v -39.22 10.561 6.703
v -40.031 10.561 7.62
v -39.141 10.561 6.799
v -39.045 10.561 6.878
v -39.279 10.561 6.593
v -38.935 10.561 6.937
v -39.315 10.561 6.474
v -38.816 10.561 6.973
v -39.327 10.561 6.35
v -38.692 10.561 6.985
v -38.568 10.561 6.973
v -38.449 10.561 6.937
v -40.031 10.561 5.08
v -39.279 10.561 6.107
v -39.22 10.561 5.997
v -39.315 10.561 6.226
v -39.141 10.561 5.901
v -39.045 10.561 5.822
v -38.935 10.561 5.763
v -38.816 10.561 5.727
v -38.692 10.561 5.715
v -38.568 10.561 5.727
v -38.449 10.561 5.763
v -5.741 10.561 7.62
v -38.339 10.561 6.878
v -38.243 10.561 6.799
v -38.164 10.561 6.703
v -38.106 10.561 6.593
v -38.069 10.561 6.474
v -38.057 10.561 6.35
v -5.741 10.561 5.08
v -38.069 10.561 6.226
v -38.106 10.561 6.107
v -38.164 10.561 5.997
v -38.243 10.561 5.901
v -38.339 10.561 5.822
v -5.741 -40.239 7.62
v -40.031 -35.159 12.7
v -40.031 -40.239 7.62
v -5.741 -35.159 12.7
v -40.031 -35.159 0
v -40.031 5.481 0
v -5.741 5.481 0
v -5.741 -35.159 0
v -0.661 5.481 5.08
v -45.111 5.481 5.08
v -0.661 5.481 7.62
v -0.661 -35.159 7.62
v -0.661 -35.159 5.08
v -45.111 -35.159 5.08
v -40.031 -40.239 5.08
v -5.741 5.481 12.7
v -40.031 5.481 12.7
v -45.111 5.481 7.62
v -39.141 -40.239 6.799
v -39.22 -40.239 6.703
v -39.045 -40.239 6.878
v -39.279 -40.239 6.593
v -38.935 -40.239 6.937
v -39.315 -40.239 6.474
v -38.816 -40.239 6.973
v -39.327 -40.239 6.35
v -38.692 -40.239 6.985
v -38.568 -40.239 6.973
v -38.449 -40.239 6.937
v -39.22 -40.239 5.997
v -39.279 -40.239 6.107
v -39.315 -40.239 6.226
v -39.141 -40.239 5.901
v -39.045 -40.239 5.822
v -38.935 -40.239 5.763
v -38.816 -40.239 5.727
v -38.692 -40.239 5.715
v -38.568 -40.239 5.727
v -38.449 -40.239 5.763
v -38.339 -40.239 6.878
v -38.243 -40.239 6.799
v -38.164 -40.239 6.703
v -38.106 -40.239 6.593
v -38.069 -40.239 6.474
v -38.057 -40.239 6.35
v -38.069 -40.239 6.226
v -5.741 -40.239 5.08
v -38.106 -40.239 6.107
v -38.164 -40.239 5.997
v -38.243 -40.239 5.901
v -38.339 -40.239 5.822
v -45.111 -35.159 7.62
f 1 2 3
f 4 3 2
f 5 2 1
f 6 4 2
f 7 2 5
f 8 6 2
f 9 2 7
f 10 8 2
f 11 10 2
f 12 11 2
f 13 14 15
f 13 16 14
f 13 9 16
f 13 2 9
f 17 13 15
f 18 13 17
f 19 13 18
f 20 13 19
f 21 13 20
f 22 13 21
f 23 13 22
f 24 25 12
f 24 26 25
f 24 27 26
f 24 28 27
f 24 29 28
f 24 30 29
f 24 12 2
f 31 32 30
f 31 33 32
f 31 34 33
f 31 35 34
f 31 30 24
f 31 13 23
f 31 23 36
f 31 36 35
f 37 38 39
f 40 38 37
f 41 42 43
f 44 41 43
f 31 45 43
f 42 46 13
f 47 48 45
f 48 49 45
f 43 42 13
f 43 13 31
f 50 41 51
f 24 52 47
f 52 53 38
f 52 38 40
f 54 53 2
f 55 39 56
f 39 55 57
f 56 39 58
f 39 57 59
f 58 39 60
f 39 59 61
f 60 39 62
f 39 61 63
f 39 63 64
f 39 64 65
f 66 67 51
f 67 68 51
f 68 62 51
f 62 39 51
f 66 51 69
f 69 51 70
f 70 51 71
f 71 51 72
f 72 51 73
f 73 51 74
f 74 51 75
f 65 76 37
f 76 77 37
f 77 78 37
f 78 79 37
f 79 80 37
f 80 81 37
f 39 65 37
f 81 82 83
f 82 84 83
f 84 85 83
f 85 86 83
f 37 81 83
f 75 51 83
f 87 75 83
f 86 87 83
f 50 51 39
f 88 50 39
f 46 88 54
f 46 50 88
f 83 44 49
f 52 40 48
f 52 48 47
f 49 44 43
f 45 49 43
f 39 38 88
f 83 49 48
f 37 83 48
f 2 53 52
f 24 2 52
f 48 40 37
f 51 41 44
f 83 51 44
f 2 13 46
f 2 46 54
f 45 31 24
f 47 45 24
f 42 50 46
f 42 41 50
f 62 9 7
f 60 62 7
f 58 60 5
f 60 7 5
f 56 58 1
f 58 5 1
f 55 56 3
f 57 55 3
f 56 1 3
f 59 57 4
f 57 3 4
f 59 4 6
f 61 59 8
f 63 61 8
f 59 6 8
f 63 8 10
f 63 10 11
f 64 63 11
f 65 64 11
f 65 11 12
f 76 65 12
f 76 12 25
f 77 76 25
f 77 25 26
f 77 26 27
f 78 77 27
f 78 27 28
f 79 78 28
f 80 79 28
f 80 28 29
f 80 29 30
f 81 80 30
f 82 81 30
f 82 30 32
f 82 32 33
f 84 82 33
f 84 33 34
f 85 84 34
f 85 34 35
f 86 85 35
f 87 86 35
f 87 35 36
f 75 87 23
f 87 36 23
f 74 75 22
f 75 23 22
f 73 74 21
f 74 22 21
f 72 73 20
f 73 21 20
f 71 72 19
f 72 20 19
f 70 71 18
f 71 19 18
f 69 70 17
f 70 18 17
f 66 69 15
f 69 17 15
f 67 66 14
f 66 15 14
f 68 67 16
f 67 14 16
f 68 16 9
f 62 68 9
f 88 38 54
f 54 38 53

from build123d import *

# Parameters (mm, degrees)
F0_W     = 44.45
F0_H     = 50.8
F1_DEPTH = 12.7
F2_SIZE  = 5.08
F4_D     = 1.27


with BuildPart() as f1:
    # F0 (on Top) → F1 (new body)
    with BuildSketch(Plane.XY):
        with Locations((-22.886127, -14.839125)):
            Rectangle(F0_W, F0_H)
    extrude(amount=F1_DEPTH)

    # F2
    f2_edges = [f1.edges().sort_by_distance(p)[0] for p in [
        (-45.111127, -14.839125, 12.7),
        (-22.886127, -40.239125, 12.7),
        (-0.661127, -14.839125, 12.7),
        (-22.886127, 10.560875, 12.7),
        (-45.111127, -14.839125, 0),
        (-22.886127, -40.239125, 0),
        (-0.661127, -14.839125, 0),
        (-0.661127, 10.560875, 6.35),
        (-45.111127, 10.560875, 6.35),
        (-22.886127, 10.560875, 0),
        (-0.661127, -40.239125, 6.35),
        (-45.111127, -40.239125, 6.35),
    ]]
    chamfer(f2_edges, length=F2_SIZE)

    # F4 (through all)
    with Locations(Plane.XZ.offset(40.239125)):
        with Locations((-38.692214, 6.35)):
            Hole(F4_D / 2)


solid = f1.part
